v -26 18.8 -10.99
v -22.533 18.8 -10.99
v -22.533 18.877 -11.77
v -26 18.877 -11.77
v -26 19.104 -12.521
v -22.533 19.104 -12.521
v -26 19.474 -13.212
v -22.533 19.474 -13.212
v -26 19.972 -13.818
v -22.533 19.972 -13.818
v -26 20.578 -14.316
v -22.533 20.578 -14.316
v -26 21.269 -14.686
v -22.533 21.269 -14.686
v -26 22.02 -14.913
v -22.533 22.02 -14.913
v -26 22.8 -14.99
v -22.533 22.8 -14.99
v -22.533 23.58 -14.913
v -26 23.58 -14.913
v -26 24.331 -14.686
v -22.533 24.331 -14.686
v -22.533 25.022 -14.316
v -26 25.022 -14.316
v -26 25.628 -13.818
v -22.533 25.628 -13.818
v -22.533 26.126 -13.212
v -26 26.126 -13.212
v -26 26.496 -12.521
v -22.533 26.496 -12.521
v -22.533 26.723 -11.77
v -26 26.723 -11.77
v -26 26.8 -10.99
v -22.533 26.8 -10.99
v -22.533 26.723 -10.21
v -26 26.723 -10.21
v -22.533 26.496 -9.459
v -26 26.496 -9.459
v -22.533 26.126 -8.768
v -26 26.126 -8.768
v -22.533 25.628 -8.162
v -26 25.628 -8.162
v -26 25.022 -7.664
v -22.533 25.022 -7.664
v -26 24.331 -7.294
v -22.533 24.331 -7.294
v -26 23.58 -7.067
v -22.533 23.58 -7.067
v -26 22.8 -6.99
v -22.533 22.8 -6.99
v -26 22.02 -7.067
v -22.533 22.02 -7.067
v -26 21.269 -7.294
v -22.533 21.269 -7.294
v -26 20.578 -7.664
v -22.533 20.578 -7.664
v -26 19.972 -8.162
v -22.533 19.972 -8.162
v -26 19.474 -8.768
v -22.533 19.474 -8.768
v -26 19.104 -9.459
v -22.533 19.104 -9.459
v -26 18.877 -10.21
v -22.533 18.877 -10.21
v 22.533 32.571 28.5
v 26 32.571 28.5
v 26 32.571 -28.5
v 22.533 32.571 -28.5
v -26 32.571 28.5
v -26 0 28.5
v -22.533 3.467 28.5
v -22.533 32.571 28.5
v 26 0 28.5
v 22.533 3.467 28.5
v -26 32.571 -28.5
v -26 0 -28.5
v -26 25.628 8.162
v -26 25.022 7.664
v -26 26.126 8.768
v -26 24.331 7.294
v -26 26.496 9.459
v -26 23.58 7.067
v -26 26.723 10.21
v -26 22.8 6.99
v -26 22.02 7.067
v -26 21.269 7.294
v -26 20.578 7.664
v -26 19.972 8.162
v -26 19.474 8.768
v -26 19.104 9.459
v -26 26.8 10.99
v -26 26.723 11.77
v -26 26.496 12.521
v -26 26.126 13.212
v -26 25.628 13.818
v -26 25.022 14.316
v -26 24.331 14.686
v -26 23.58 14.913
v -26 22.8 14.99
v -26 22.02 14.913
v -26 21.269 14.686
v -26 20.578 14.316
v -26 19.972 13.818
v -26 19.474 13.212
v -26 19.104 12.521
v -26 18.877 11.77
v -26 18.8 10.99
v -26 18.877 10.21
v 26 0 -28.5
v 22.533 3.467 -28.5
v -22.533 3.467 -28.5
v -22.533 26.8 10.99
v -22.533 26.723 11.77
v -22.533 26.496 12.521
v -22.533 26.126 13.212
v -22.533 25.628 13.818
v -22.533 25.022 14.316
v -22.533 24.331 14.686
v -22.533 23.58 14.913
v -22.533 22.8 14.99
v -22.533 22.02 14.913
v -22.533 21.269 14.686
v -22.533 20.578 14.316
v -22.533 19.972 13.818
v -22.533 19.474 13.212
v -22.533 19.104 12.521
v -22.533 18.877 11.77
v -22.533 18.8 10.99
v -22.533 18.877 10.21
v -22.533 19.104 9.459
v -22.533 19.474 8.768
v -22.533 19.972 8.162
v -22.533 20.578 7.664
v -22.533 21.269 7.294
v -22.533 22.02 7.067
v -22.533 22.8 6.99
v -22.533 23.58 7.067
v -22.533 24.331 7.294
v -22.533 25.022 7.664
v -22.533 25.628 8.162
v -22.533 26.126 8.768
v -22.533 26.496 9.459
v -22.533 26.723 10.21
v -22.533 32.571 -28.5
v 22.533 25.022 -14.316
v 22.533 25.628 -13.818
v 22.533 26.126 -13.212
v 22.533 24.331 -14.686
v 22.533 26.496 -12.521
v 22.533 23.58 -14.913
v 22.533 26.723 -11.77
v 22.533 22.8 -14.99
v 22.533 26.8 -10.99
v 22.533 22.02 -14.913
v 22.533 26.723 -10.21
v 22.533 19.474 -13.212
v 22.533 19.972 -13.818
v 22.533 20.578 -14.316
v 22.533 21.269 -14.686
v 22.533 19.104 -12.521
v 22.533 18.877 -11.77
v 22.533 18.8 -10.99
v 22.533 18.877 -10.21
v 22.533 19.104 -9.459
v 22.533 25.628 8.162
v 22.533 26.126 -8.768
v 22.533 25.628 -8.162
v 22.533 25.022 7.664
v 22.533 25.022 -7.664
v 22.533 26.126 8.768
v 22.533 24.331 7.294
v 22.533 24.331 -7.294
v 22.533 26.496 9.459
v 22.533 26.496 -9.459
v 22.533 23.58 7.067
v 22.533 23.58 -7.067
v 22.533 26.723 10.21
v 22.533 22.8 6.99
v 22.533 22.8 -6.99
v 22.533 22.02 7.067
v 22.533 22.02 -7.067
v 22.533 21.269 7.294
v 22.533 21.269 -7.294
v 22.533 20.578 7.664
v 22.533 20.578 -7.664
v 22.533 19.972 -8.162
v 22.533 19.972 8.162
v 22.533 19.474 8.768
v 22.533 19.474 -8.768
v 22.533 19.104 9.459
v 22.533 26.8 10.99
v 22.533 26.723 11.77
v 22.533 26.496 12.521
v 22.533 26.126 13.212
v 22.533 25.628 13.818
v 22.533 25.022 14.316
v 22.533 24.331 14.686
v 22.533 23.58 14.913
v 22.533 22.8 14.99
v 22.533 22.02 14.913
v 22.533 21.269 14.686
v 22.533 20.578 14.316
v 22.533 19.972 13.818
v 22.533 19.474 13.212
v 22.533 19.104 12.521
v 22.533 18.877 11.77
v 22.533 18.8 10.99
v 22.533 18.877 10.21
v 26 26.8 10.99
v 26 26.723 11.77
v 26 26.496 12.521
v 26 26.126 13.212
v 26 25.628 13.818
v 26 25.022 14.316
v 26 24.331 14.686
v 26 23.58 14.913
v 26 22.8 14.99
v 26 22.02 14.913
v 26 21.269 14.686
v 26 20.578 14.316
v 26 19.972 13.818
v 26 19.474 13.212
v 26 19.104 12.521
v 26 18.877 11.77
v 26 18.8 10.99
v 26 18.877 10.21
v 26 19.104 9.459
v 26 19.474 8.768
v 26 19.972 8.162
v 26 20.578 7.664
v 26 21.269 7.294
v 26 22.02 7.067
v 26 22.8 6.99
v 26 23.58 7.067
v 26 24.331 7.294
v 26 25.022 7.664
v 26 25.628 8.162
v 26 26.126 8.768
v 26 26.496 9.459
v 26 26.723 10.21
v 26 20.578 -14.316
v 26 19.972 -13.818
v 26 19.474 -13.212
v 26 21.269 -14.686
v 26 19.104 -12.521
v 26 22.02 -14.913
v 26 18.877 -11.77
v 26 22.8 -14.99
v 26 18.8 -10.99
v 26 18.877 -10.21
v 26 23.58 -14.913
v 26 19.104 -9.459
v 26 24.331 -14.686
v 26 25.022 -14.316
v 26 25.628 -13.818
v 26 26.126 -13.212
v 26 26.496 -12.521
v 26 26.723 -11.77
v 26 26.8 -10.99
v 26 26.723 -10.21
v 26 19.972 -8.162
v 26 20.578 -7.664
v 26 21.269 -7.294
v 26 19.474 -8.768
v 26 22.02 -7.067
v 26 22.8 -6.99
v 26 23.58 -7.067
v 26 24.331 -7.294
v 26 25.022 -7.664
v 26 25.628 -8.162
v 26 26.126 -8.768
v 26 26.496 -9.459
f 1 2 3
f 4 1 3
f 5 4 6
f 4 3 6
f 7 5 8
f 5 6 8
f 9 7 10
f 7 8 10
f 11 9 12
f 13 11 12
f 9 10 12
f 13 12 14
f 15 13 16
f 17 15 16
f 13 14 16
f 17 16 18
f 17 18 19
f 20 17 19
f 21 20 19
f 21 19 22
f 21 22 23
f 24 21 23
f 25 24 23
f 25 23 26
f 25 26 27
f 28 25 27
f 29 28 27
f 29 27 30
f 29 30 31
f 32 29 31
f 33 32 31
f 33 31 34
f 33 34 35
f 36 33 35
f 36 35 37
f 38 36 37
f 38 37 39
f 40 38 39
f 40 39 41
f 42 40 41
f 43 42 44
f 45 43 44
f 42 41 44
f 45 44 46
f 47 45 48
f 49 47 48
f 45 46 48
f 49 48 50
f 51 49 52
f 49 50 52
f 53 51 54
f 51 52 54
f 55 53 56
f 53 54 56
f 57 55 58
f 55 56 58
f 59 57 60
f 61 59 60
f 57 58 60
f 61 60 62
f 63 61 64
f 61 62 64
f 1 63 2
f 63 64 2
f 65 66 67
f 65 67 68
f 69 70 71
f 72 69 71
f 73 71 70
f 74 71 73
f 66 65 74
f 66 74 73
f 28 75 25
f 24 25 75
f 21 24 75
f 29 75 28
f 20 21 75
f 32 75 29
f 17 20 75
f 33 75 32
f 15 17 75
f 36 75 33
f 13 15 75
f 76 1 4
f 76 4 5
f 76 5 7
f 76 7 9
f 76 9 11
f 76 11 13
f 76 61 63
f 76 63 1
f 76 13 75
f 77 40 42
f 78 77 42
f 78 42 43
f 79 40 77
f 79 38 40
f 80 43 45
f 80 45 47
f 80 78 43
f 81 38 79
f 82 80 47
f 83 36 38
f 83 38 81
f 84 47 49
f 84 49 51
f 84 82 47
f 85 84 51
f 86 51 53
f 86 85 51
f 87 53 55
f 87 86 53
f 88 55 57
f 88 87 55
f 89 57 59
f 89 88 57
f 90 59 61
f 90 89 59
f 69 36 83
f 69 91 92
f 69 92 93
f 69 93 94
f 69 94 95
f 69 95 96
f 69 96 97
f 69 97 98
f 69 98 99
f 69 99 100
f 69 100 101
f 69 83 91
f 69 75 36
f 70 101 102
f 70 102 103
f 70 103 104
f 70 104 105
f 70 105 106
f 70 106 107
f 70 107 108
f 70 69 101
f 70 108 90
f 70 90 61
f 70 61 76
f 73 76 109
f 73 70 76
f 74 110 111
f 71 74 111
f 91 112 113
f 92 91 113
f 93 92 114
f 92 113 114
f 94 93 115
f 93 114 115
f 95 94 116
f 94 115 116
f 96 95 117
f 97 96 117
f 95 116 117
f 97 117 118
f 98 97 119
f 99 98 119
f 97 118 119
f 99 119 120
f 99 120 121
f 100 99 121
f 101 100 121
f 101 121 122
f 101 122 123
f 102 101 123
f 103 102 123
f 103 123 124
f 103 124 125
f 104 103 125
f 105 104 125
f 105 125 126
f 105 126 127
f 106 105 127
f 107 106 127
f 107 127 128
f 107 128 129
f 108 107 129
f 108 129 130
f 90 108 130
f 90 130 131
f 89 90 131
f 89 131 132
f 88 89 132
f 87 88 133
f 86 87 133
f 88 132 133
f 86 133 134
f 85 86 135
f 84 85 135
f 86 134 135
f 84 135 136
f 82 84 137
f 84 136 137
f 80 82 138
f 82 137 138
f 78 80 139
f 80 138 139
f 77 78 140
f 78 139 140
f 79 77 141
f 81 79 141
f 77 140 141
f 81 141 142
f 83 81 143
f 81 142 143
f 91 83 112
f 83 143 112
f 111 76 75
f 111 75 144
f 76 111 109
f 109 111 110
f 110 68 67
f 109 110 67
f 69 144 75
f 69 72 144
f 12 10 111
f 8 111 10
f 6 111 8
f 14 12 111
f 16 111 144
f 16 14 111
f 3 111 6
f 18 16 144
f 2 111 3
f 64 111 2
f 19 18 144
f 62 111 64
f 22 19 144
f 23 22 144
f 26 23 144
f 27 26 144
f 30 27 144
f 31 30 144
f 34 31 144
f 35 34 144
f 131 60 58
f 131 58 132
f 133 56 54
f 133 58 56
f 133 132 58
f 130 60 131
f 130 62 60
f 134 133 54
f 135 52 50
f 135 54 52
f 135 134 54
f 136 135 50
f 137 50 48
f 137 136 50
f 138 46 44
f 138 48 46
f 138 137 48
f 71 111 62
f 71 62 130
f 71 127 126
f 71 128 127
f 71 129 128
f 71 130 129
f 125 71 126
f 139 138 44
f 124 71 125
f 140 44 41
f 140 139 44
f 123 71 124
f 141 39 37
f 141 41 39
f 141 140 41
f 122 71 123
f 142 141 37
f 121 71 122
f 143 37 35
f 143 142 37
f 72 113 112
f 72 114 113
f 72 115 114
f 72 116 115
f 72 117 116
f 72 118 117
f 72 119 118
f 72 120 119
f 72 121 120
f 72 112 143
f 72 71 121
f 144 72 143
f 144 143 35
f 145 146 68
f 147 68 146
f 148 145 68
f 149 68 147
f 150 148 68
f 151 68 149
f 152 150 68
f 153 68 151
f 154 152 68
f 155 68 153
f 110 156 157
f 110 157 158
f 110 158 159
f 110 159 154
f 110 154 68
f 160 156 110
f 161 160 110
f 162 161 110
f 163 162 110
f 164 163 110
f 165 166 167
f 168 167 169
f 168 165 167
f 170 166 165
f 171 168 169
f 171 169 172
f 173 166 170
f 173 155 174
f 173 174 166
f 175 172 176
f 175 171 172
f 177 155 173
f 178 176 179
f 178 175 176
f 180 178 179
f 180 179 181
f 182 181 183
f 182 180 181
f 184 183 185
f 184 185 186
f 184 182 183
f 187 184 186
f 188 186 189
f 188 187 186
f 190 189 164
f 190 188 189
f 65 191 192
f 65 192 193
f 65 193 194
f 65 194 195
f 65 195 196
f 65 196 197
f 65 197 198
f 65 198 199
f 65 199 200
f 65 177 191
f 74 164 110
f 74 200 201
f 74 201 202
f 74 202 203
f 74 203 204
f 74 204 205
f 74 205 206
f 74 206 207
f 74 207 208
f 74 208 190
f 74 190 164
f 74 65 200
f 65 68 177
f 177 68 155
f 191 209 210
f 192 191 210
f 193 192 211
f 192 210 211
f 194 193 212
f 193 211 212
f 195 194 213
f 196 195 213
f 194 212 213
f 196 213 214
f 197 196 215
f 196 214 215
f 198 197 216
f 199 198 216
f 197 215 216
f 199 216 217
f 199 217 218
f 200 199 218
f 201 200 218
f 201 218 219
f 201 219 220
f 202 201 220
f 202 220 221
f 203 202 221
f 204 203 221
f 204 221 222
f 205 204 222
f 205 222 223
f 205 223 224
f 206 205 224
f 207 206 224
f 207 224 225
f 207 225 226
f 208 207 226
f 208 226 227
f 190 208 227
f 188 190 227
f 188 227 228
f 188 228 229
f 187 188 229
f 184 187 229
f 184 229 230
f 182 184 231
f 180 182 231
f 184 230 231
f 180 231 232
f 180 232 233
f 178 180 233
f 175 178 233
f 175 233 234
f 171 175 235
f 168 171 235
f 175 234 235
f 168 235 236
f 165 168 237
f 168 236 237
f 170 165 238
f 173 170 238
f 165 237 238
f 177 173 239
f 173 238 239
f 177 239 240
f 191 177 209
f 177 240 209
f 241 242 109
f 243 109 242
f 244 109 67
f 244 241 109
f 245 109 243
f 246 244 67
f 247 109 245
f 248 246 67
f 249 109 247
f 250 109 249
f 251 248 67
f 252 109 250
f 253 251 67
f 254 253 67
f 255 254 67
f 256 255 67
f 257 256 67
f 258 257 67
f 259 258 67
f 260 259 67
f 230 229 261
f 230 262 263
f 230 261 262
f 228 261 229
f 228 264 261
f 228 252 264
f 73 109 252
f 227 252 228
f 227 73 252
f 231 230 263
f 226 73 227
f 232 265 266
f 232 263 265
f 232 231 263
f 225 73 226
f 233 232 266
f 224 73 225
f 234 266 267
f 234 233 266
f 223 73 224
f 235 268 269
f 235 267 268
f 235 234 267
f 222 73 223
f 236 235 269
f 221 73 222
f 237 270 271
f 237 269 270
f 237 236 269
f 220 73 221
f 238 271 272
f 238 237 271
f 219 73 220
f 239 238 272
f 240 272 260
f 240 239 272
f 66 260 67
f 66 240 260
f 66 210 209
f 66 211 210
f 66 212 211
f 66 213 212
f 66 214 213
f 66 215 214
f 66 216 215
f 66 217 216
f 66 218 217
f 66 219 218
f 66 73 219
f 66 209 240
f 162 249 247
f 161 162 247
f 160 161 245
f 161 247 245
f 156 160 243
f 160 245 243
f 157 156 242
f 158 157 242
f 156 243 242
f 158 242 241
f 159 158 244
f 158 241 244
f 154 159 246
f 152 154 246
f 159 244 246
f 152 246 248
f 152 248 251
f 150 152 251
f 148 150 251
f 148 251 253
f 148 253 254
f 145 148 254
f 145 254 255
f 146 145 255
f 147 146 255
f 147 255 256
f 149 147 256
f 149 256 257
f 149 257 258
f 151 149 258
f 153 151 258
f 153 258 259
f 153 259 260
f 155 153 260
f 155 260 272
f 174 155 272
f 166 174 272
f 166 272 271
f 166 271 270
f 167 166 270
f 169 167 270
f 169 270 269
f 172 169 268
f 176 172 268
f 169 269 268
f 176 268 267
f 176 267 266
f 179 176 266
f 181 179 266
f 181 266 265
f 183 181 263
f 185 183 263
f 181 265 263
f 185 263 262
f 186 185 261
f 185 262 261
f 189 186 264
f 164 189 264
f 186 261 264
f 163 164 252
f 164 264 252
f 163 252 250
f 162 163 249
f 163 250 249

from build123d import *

# Parameters (mm, degrees)
BOSS_EXTRUDE1_DEPTH = 28.5
SKETCH2_R           = 4
CUT_EXTRUDE1_DEPTH  = 68.6546226


with BuildPart() as part:
    # Sketch1 → Boss-Extrude1 (new, symmetric)
    with BuildSketch(Plane.XY):
        Polygon((-26, 0), (26, 0), (26, 32.571428571), (22.533333333, 32.571428571), (22.533333333, 3.466666667), (-22.533333333, 3.466666667), (-22.533333333, 32.571428571), (-26, 32.571428571), align=None)
    extrude(amount=BOSS_EXTRUDE1_DEPTH, both=True)

    # Sketch2 → Cut-Extrude1 (cut, through all)
    with BuildSketch(Plane(origin=(26, 0, 0), x_dir=(0, 0, -1), z_dir=(1, 0, 0))):
        with Locations(Location((-10.99, 22.8, 0), (0, 0, 90))):
            Circle(SKETCH2_R)
        with Locations(Location((10.99, 22.8, 0), (0, 0, 270))):
            Circle(SKETCH2_R)
    extrude(amount=-CUT_EXTRUDE1_DEPTH, mode=Mode.SUBTRACT)


solid = part.part
